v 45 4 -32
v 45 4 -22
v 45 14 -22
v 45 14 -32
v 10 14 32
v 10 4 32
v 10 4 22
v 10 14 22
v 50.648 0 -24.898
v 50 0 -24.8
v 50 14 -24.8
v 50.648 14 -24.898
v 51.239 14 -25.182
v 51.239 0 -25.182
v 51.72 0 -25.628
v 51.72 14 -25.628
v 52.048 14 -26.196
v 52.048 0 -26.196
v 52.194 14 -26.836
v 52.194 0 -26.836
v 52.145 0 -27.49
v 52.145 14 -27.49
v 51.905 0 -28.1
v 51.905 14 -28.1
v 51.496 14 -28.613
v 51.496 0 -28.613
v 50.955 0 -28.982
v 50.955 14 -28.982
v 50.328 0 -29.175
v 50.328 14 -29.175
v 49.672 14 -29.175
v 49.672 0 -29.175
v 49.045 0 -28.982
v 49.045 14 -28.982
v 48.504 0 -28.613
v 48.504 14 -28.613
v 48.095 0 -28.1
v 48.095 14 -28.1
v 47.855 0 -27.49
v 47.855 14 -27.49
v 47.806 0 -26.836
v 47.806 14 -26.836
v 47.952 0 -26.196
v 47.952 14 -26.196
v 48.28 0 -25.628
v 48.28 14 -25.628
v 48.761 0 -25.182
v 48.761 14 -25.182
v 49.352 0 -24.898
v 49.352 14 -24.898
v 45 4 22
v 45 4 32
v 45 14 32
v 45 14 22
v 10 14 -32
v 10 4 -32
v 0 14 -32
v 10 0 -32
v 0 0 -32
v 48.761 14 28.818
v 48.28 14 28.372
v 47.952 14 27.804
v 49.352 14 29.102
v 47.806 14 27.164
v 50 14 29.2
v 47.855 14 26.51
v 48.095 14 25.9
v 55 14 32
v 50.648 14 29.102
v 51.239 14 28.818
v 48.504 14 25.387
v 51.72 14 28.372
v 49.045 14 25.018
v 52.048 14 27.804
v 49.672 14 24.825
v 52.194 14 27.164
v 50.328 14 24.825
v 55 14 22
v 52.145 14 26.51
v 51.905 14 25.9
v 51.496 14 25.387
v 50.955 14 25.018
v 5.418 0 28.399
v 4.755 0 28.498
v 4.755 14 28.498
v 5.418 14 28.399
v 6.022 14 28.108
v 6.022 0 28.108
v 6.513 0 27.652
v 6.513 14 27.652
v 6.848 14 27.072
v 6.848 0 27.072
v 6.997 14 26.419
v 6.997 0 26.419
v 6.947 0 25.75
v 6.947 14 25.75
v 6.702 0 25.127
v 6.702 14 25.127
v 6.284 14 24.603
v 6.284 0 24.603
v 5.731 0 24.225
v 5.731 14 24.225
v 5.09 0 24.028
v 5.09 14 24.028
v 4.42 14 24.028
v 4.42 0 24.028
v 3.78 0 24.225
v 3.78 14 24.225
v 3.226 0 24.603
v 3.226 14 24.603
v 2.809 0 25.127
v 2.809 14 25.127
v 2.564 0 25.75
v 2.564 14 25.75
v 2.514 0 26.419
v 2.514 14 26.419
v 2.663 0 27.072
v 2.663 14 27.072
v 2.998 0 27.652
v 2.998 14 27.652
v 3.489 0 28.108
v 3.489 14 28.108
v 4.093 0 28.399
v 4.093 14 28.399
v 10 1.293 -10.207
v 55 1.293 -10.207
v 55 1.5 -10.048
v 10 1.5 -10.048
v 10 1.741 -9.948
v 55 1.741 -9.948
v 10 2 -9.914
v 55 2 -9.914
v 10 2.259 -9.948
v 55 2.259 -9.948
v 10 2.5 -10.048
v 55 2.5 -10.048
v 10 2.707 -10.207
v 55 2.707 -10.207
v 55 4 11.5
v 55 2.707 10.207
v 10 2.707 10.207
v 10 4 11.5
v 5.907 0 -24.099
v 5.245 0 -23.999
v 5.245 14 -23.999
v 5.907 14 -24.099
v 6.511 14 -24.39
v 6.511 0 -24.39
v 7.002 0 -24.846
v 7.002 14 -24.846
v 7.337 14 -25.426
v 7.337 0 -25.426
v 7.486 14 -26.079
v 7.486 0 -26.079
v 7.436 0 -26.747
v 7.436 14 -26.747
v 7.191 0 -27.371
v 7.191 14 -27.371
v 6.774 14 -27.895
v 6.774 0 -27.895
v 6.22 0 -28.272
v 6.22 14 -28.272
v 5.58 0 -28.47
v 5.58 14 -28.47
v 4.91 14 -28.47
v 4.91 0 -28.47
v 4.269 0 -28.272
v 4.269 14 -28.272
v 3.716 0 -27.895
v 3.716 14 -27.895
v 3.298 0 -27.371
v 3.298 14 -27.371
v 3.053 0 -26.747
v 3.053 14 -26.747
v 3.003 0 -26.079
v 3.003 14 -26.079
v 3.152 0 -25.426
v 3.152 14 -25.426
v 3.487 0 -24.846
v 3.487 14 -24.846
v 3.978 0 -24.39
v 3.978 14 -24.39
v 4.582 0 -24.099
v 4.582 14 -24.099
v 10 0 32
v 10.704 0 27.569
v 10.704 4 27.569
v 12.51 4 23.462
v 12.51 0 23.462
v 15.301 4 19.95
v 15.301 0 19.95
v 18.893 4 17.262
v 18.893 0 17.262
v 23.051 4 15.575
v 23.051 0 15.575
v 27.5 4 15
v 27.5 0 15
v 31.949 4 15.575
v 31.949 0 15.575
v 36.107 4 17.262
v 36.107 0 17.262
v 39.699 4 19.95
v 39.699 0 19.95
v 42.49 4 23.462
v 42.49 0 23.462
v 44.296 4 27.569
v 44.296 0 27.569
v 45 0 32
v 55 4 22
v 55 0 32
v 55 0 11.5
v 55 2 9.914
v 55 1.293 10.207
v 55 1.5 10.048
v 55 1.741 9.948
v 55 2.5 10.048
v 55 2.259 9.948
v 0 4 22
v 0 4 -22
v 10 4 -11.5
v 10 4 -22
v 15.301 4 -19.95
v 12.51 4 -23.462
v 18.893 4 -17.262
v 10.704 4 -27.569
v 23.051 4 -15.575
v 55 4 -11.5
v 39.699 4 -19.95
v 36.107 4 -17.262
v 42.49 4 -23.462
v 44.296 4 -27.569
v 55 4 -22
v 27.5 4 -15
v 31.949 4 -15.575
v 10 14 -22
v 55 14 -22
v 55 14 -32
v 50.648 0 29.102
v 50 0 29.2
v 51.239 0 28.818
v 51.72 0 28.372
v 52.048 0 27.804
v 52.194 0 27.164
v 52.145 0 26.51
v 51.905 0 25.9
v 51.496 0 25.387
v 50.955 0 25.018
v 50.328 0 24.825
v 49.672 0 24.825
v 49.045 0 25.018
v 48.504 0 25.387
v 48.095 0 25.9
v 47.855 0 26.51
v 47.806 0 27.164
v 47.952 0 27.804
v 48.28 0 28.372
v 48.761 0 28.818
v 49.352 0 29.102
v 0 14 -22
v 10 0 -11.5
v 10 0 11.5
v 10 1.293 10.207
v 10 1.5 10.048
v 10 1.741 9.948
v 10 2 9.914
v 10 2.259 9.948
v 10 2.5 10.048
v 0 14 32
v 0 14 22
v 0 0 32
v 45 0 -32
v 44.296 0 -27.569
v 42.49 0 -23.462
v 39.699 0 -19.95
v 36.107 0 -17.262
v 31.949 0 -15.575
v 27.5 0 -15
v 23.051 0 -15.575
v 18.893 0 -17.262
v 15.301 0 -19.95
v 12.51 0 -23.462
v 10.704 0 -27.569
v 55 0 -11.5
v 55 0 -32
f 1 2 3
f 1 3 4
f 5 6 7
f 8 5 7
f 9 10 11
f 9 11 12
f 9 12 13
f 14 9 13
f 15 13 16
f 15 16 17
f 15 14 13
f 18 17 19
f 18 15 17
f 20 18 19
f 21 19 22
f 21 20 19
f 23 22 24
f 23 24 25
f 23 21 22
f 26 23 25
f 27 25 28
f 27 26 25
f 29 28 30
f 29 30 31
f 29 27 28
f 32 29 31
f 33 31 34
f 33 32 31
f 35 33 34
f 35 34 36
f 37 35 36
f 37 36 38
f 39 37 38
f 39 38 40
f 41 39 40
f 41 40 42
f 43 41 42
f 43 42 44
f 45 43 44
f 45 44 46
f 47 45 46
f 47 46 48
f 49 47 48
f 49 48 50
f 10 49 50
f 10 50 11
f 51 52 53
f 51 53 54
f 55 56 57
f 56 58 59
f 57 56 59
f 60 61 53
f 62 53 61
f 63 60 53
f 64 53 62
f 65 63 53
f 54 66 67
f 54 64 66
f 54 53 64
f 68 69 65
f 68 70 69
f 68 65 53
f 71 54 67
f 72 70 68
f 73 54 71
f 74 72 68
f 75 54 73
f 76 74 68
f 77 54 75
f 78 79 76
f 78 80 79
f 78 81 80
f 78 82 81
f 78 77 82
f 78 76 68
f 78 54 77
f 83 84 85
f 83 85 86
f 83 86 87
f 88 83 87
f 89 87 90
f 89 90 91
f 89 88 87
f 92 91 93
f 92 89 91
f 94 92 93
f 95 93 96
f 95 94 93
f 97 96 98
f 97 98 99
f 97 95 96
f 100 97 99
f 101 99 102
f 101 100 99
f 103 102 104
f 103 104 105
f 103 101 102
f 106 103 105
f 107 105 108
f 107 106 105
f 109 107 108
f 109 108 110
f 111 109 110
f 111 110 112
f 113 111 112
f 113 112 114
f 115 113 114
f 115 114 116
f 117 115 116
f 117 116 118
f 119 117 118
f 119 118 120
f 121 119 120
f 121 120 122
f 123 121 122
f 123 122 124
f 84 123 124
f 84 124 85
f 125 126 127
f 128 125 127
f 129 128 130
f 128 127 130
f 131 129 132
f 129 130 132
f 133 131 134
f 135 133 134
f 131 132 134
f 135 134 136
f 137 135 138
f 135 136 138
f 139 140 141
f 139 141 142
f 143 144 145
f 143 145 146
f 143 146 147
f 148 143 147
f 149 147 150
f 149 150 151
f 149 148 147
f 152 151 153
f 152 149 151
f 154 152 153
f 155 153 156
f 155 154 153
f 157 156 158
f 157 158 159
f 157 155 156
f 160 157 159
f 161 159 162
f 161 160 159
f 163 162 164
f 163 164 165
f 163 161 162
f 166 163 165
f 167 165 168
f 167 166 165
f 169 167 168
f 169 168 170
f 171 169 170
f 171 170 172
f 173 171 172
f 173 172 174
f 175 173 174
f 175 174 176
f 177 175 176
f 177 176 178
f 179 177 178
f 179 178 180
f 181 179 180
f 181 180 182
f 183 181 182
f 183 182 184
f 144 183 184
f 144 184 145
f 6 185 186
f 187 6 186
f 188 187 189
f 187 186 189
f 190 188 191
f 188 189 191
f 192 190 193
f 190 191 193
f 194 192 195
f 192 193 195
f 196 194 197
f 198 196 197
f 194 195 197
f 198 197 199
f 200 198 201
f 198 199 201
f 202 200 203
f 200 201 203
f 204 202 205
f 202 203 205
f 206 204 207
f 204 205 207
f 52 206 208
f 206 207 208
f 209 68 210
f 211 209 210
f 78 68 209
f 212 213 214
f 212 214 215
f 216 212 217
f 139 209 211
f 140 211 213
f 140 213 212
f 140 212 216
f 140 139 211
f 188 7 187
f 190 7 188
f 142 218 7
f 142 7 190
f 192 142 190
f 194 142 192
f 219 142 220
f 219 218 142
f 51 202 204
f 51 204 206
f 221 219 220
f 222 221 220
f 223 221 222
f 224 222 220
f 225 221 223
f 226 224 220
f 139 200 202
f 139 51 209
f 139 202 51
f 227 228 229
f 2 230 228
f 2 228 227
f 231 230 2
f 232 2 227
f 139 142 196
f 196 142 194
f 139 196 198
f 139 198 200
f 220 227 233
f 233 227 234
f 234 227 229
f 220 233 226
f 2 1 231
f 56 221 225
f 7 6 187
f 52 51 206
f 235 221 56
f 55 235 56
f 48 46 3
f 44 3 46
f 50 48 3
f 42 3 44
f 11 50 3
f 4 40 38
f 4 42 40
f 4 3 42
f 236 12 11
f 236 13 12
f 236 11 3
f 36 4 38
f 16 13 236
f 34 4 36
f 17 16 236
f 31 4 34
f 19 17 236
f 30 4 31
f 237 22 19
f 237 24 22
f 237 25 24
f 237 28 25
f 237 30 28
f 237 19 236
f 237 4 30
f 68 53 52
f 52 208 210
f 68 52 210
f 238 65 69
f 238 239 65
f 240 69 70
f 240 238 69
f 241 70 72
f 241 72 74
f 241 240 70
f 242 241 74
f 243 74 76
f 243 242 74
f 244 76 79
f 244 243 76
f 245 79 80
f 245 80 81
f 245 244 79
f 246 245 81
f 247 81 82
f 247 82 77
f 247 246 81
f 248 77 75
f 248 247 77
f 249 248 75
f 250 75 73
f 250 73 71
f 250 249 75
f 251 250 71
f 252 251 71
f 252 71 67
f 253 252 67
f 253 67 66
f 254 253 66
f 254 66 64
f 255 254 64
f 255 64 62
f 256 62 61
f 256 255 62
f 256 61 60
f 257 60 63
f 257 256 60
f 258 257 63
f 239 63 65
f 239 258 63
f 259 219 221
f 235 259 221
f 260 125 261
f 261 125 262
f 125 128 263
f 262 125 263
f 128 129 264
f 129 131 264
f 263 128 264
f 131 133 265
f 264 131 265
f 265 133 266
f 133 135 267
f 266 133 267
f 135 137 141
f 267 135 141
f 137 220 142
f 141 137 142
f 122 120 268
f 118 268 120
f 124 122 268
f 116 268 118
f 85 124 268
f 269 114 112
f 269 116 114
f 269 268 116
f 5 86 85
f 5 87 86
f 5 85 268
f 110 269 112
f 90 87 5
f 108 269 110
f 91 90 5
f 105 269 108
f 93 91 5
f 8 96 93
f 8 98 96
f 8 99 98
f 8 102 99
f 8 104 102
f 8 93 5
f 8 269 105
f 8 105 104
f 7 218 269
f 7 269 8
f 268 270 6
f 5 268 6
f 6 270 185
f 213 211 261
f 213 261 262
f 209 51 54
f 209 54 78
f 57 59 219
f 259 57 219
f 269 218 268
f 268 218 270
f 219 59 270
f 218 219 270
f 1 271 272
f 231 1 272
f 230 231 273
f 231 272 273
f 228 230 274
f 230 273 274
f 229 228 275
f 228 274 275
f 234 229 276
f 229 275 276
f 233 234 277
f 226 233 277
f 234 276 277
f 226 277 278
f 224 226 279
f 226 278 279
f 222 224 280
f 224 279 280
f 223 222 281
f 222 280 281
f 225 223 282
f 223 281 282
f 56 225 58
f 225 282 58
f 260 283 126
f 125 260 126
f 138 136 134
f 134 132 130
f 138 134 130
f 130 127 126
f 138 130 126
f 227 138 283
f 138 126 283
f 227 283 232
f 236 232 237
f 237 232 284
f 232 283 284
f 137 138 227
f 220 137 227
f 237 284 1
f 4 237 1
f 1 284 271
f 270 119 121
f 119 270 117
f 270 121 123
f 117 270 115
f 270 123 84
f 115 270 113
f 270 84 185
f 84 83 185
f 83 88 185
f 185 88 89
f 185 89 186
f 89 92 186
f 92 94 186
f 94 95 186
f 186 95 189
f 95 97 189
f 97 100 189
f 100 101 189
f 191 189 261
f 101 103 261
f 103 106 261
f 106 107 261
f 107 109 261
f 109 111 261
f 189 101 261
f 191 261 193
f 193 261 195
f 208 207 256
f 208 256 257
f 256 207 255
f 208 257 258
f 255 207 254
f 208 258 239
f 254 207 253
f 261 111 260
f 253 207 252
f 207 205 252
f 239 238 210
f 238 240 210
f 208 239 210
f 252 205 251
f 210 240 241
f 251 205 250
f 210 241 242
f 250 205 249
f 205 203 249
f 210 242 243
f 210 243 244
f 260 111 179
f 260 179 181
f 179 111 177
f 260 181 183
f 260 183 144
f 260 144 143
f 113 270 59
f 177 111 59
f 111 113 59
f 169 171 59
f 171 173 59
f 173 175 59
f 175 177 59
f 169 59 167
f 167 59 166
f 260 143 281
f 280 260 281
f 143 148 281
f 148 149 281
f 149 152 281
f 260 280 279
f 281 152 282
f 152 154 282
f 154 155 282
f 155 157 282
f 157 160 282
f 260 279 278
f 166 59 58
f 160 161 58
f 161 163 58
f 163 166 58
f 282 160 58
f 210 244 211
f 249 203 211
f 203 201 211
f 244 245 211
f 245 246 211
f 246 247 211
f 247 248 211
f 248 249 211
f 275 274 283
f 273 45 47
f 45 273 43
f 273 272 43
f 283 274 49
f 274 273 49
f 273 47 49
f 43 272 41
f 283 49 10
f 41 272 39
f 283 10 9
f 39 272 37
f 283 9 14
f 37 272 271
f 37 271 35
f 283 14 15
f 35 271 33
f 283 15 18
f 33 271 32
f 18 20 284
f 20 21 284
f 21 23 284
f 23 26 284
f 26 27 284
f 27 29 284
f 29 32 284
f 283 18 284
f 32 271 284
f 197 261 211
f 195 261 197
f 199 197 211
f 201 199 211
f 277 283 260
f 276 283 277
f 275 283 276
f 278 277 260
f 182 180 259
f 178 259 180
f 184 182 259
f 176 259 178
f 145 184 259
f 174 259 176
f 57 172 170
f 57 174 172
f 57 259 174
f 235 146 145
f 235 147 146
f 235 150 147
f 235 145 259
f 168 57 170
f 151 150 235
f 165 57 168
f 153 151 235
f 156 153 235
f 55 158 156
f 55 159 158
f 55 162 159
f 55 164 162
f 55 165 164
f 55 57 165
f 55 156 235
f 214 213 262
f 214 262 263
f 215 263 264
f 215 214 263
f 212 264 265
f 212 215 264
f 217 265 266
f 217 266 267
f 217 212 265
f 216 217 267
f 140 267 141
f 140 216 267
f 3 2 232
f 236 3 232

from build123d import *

# Parameters (mm, degrees)
SKETCH1_R           = 2.2479
SKETCH1_R_2         = 2.2
EXTRUDE_BODY_DEPTH  = 4
SKETCH5_W           = 10
SKETCH5_H           = 10
SKETCH5_R           = 2.2
SKETCH5_R_2         = 2.2479
EXTRUDE_LEGS_DEPTH  = 10
SKETCH6_W           = 45
SKETCH6_H           = 0.5
BOSS_EXTRUDE1_DEPTH = 4
CUT_EXTRUDE1_DEPTH  = 45


with BuildPart() as part:
    # Sketch1 → Extrude-Body (new body)
    with BuildSketch(Plane(origin=(0, 0, 0), x_dir=(1, 0, 0), z_dir=(0, 1, 0))):
        with BuildLine():
            Line((10, -10), (10, 10))
            Line((10, 10), (45, 10))
            Line((45, 10), (55, 10))
            Line((55, 10), (55, 20))
            Line((55, 20), (55, 32))
            Line((55, 32), (45, 32))
            ThreePointArc((45, 32), (27.5, 15), (10, 32))
            Line((10, 32), (0, 32))
            Line((0, 32), (0, 20))
            Line((0, 20), (0, -20))
            Line((0, -20), (0, -32))
            Line((0, -32), (10, -32))
            ThreePointArc((10, -32), (27.5, -15), (45, -32))
            Line((45, -32), (55, -32))
            Line((55, -32), (55, -20))
            Line((55, -20), (55, -10))
            Line((55, -10), (45, -10))
            Line((45, -10), (10, -10))
        make_face()
        with Locations(Location((4.755333622, -26.250570114, 0), (0, 0, 270))):
            Circle(SKETCH1_R, mode=Mode.SUBTRACT)
        with Locations(Location((50, -27, 0), (0, 0, 270))):
            Circle(SKETCH1_R_2, mode=Mode.SUBTRACT)
        with Locations(Location((5.244634233, 26.247149693, 0), (0, 0, 270))):
            Circle(SKETCH1_R, mode=Mode.SUBTRACT)
        with Locations(Location((50, 27, 0), (0, 0, 270))):
            Circle(SKETCH1_R_2, mode=Mode.SUBTRACT)
    extrude(amount=EXTRUDE_BODY_DEPTH)

    # Sketch5 → Extrude-Legs (add)
    # profile 1 of 4: a face of its own
    with BuildSketch(Plane(origin=(0, 4, 0), x_dir=(1, 0, 0), z_dir=(0, 1, 0))):
        with Locations((50, -27)):
            Rectangle(SKETCH5_W, SKETCH5_H)
        with Locations(Location((50, -27, 0), (0, 0, 270))):
            Circle(SKETCH5_R, mode=Mode.SUBTRACT)
    # profile 2 of 4: a face of its own
    with BuildSketch(Plane(origin=(0, 4, 0), x_dir=(1, 0, 0), z_dir=(0, 1, 0))):
        with Locations((50, 27)):
            Rectangle(SKETCH5_W, SKETCH5_H)
        with Locations(Location((50, 27, 0), (0, 0, 270))):
            Circle(SKETCH5_R, mode=Mode.SUBTRACT)
    # profile 3 of 4: a face of its own
    with BuildSketch(Plane(origin=(0, 4, 0), x_dir=(1, 0, 0), z_dir=(0, 1, 0))):
        with Locations((5, 27)):
            Rectangle(SKETCH5_W, SKETCH5_H)
        with Locations(Location((5.244634233, 26.247149693, 0), (0, 0, 270))):
            Circle(SKETCH5_R_2, mode=Mode.SUBTRACT)
    # profile 4 of 4: a face of its own
    with BuildSketch(Plane(origin=(0, 4, 0), x_dir=(1, 0, 0), z_dir=(0, 1, 0))):
        with Locations((5, -27)):
            Rectangle(SKETCH5_W, SKETCH5_H)
        with Locations(Location((4.755333622, -26.250570114, 0), (0, 0, 270))):
            Circle(SKETCH5_R_2, mode=Mode.SUBTRACT)
    extrude(amount=EXTRUDE_LEGS_DEPTH)

    # Sketch6 → Boss-Extrude1 (add)
    with BuildSketch(Plane(origin=(0, 4, 0), x_dir=(1, 0, 0), z_dir=(0, 1, 0))):
        with Locations((32.5, -9.75)):
            Rectangle(SKETCH6_W, SKETCH6_H)
        with Locations((32.5, 9.75)):
            Rectangle(SKETCH6_W, SKETCH6_H)
    extrude(amount=-BOSS_EXTRUDE1_DEPTH)

    # Sketch7 → Cut-Extrude1 (cut)
    with BuildSketch(Plane(origin=(55, 0, 0), x_dir=(0, 0, -1), z_dir=(1, 0, 0))):
        with BuildLine():
            Line((-10.207106781, 2.707106781), (-11.5, 4))
            Line((-11.5, 4), (-9.5, 4))
            Line((-9.5, 4), (-9.5, 0))
            Line((-9.5, 0), (-11.5, 0))
            Line((-11.5, 0), (-10.207106781, 1.292893219))
            ThreePointArc((-10.207106781, 1.292893219), (-9.914213562, 2), (-10.207106781, 2.707106781))
        make_face()
        with BuildLine():
            Line((10.207106781, 2.707106781), (11.5, 4))
            Line((11.5, 4), (9.5, 4))
            Line((9.5, 4), (9.5, 0))
            Line((9.5, 0), (11.5, 0))
            Line((11.5, 0), (10.207106781, 1.292893219))
            ThreePointArc((10.207106781, 1.292893219), (9.914213562, 2), (10.207106781, 2.707106781))
        make_face()
    extrude(amount=-CUT_EXTRUDE1_DEPTH, mode=Mode.SUBTRACT)


solid = part.part
